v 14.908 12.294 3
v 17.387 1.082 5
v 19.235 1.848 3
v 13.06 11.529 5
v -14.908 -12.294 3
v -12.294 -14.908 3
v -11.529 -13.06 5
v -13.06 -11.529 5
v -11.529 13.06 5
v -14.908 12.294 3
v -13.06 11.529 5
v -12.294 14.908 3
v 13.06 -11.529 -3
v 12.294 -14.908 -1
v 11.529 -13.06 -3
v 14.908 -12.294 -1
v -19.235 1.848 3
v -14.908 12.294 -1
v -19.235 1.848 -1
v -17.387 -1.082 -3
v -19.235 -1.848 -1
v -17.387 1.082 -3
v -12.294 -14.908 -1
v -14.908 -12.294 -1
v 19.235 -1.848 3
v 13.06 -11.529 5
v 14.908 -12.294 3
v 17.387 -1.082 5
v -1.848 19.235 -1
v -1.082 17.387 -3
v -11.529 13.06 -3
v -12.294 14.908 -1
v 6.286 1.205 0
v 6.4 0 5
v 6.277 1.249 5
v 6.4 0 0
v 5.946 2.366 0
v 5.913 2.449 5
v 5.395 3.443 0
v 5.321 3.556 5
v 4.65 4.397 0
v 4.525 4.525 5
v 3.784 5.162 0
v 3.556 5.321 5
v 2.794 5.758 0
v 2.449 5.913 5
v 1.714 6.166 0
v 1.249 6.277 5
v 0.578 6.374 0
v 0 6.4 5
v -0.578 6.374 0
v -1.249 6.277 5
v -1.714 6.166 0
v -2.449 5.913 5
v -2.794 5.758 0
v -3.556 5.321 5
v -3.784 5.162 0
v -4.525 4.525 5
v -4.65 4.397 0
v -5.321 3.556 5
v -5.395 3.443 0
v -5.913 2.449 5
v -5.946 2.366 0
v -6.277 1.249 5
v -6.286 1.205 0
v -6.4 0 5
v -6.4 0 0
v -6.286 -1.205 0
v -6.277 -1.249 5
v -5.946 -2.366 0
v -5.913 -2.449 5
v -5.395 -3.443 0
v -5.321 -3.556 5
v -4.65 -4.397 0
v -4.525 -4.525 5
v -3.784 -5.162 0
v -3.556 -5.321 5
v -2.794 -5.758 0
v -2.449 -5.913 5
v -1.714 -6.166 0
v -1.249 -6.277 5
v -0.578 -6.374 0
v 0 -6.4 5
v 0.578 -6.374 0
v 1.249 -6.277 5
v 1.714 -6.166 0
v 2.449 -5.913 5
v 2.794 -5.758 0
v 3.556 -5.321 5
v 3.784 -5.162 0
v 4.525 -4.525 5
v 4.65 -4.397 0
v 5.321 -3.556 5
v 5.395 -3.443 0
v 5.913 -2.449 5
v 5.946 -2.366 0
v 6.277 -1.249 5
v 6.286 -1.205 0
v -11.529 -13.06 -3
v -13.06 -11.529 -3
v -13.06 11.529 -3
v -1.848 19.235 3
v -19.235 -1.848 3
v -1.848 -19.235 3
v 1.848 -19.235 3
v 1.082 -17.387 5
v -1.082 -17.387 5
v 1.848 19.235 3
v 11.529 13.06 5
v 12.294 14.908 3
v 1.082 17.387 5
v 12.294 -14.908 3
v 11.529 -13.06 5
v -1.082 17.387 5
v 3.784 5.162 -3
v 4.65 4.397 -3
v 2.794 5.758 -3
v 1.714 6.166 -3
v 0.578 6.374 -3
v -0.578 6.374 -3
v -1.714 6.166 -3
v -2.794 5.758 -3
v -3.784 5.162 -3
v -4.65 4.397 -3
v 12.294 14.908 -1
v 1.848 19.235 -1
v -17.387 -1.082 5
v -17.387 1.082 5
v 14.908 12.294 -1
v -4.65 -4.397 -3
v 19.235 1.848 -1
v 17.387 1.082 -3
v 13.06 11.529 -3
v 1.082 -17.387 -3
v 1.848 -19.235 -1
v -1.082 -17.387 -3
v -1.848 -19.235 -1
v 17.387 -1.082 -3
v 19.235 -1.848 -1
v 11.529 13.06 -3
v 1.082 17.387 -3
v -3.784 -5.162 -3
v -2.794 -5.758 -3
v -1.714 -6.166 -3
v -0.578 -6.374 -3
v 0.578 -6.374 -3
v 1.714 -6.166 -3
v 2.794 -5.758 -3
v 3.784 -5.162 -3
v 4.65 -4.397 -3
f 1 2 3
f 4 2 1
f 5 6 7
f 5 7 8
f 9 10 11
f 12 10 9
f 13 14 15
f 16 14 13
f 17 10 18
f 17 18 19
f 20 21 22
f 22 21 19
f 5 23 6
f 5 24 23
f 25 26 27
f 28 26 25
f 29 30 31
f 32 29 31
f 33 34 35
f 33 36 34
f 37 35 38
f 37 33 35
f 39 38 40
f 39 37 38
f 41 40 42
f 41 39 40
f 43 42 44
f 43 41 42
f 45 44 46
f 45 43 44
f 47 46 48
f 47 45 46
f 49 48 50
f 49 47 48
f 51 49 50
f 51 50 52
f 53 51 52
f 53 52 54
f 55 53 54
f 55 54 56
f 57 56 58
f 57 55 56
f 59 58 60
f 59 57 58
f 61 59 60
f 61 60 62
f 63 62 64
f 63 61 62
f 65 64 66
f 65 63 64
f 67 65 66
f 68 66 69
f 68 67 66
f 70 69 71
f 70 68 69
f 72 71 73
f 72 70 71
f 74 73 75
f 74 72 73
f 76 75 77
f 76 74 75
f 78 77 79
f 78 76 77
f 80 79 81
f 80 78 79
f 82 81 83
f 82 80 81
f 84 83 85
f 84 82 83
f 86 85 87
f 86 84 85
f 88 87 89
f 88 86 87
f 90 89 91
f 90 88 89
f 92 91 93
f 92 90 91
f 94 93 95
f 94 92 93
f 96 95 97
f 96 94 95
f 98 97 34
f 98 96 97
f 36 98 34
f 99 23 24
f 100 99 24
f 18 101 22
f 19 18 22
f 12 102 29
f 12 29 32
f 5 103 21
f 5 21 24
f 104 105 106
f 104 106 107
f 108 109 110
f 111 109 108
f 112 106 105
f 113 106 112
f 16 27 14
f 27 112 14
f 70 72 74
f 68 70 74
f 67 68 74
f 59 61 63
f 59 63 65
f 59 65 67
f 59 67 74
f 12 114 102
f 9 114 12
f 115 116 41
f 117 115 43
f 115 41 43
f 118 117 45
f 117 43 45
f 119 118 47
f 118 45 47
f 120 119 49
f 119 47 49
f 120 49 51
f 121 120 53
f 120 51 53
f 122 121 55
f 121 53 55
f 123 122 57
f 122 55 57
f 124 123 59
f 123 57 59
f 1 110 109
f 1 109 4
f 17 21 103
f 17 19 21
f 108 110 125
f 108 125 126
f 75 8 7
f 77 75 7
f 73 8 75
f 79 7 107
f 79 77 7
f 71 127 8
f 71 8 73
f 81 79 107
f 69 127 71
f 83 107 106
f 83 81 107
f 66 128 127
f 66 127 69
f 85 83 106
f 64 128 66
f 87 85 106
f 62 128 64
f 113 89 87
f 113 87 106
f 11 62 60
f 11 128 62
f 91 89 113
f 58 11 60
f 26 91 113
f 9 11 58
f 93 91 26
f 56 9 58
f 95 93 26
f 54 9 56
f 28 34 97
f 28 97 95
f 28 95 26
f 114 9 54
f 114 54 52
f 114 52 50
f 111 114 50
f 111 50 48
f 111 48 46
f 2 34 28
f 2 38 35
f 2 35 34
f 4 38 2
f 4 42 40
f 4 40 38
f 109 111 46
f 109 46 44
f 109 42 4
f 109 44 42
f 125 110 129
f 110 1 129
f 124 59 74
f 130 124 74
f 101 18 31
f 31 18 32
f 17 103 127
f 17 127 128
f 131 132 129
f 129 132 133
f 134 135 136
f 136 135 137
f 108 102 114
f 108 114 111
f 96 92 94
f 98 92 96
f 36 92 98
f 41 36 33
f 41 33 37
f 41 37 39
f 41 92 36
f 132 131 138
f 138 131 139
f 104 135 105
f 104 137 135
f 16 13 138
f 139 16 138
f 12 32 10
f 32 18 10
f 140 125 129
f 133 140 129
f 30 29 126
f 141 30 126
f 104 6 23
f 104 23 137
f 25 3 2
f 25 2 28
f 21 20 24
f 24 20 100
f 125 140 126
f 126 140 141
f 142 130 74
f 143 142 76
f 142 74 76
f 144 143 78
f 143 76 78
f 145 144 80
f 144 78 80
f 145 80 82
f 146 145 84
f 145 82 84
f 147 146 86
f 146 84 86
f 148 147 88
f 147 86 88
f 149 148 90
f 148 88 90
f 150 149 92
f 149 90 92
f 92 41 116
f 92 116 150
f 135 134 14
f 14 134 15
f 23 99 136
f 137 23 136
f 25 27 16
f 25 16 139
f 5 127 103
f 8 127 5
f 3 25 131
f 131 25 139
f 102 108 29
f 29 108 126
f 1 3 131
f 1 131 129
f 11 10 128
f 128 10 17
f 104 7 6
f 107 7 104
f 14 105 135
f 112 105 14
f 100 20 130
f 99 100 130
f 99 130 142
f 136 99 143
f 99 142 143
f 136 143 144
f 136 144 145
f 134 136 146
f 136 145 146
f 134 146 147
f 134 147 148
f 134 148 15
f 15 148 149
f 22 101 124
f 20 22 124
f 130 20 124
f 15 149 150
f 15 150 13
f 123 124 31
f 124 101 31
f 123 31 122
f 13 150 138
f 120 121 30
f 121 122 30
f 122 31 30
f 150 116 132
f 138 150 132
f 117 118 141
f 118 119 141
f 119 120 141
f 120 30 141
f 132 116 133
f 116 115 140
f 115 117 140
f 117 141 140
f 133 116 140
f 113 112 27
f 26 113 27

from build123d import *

# Parameters (mm, degrees)
PAD_DEPTH      = 5
PAD_DEPTH_BACK = 3
SKETCH002_R    = 6.4
POCKET_DEPTH   = 5.001
CHAMFER_SIZE   = 2


with BuildPart() as part:
    # Sketch → Pad (new body, two sides)
    with BuildSketch(Plane.XY) as pad_sk:
        Polygon((0, 20), (-14.142136, 14.142136), (-20, 0), (-14.142136, -14.142136), (0, -20), (14.142136, -14.142136), (20, 0), (14.142136, 14.142136), align=None)
        with BuildLine():
            Line((4.65, 4.397442), (4.65, -4.397442))
            ThreePointArc((-4.65, -4.397442), (0, -6.4), (4.65, -4.397442))
            Line((-4.65, 4.397442), (-4.65, -4.397442))
            ThreePointArc((4.65, 4.397442), (0, 6.4), (-4.65, 4.397442))
        make_face(mode=Mode.SUBTRACT)
    extrude(amount=PAD_DEPTH)
    extrude(pad_sk.sketch, amount=-PAD_DEPTH_BACK)

    # Sketch002 → Pocket (cut, through all)
    with BuildSketch(Plane.XY):
        Circle(SKETCH002_R)
    extrude(amount=POCKET_DEPTH, mode=Mode.SUBTRACT)

    # Chamfer
    chamfer_edges = [part.edges().sort_by_distance(p)[0] for p in [
        (0, -20, 1),
        (14.142136, -14.142136, 1),
        (7.071068, -17.071068, -3),
        (7.071068, -17.071068, 5),
        (-14.142136, -14.142136, 1),
        (-7.071068, -17.071068, -3),
        (-7.071068, -17.071068, 5),
        (-20, 0, 1),
        (-17.071068, -7.071068, -3),
        (-17.071068, -7.071068, 5),
        (-14.142136, 14.142136, 1),
        (-17.071068, 7.071068, -3),
        (-17.071068, 7.071068, 5),
        (0, 20, 1),
        (-7.071068, 17.071068, -3),
        (-7.071068, 17.071068, 5),
        (14.142136, 14.142136, 1),
        (7.071068, 17.071068, -3),
        (7.071068, 17.071068, 5),
        (20, 0, 1),
        (17.071068, 7.071068, -3),
        (17.071068, 7.071068, 5),
        (17.071068, -7.071068, -3),
        (17.071068, -7.071068, 5),
    ]]
    chamfer(chamfer_edges, length=CHAMFER_SIZE)


solid = part.part
